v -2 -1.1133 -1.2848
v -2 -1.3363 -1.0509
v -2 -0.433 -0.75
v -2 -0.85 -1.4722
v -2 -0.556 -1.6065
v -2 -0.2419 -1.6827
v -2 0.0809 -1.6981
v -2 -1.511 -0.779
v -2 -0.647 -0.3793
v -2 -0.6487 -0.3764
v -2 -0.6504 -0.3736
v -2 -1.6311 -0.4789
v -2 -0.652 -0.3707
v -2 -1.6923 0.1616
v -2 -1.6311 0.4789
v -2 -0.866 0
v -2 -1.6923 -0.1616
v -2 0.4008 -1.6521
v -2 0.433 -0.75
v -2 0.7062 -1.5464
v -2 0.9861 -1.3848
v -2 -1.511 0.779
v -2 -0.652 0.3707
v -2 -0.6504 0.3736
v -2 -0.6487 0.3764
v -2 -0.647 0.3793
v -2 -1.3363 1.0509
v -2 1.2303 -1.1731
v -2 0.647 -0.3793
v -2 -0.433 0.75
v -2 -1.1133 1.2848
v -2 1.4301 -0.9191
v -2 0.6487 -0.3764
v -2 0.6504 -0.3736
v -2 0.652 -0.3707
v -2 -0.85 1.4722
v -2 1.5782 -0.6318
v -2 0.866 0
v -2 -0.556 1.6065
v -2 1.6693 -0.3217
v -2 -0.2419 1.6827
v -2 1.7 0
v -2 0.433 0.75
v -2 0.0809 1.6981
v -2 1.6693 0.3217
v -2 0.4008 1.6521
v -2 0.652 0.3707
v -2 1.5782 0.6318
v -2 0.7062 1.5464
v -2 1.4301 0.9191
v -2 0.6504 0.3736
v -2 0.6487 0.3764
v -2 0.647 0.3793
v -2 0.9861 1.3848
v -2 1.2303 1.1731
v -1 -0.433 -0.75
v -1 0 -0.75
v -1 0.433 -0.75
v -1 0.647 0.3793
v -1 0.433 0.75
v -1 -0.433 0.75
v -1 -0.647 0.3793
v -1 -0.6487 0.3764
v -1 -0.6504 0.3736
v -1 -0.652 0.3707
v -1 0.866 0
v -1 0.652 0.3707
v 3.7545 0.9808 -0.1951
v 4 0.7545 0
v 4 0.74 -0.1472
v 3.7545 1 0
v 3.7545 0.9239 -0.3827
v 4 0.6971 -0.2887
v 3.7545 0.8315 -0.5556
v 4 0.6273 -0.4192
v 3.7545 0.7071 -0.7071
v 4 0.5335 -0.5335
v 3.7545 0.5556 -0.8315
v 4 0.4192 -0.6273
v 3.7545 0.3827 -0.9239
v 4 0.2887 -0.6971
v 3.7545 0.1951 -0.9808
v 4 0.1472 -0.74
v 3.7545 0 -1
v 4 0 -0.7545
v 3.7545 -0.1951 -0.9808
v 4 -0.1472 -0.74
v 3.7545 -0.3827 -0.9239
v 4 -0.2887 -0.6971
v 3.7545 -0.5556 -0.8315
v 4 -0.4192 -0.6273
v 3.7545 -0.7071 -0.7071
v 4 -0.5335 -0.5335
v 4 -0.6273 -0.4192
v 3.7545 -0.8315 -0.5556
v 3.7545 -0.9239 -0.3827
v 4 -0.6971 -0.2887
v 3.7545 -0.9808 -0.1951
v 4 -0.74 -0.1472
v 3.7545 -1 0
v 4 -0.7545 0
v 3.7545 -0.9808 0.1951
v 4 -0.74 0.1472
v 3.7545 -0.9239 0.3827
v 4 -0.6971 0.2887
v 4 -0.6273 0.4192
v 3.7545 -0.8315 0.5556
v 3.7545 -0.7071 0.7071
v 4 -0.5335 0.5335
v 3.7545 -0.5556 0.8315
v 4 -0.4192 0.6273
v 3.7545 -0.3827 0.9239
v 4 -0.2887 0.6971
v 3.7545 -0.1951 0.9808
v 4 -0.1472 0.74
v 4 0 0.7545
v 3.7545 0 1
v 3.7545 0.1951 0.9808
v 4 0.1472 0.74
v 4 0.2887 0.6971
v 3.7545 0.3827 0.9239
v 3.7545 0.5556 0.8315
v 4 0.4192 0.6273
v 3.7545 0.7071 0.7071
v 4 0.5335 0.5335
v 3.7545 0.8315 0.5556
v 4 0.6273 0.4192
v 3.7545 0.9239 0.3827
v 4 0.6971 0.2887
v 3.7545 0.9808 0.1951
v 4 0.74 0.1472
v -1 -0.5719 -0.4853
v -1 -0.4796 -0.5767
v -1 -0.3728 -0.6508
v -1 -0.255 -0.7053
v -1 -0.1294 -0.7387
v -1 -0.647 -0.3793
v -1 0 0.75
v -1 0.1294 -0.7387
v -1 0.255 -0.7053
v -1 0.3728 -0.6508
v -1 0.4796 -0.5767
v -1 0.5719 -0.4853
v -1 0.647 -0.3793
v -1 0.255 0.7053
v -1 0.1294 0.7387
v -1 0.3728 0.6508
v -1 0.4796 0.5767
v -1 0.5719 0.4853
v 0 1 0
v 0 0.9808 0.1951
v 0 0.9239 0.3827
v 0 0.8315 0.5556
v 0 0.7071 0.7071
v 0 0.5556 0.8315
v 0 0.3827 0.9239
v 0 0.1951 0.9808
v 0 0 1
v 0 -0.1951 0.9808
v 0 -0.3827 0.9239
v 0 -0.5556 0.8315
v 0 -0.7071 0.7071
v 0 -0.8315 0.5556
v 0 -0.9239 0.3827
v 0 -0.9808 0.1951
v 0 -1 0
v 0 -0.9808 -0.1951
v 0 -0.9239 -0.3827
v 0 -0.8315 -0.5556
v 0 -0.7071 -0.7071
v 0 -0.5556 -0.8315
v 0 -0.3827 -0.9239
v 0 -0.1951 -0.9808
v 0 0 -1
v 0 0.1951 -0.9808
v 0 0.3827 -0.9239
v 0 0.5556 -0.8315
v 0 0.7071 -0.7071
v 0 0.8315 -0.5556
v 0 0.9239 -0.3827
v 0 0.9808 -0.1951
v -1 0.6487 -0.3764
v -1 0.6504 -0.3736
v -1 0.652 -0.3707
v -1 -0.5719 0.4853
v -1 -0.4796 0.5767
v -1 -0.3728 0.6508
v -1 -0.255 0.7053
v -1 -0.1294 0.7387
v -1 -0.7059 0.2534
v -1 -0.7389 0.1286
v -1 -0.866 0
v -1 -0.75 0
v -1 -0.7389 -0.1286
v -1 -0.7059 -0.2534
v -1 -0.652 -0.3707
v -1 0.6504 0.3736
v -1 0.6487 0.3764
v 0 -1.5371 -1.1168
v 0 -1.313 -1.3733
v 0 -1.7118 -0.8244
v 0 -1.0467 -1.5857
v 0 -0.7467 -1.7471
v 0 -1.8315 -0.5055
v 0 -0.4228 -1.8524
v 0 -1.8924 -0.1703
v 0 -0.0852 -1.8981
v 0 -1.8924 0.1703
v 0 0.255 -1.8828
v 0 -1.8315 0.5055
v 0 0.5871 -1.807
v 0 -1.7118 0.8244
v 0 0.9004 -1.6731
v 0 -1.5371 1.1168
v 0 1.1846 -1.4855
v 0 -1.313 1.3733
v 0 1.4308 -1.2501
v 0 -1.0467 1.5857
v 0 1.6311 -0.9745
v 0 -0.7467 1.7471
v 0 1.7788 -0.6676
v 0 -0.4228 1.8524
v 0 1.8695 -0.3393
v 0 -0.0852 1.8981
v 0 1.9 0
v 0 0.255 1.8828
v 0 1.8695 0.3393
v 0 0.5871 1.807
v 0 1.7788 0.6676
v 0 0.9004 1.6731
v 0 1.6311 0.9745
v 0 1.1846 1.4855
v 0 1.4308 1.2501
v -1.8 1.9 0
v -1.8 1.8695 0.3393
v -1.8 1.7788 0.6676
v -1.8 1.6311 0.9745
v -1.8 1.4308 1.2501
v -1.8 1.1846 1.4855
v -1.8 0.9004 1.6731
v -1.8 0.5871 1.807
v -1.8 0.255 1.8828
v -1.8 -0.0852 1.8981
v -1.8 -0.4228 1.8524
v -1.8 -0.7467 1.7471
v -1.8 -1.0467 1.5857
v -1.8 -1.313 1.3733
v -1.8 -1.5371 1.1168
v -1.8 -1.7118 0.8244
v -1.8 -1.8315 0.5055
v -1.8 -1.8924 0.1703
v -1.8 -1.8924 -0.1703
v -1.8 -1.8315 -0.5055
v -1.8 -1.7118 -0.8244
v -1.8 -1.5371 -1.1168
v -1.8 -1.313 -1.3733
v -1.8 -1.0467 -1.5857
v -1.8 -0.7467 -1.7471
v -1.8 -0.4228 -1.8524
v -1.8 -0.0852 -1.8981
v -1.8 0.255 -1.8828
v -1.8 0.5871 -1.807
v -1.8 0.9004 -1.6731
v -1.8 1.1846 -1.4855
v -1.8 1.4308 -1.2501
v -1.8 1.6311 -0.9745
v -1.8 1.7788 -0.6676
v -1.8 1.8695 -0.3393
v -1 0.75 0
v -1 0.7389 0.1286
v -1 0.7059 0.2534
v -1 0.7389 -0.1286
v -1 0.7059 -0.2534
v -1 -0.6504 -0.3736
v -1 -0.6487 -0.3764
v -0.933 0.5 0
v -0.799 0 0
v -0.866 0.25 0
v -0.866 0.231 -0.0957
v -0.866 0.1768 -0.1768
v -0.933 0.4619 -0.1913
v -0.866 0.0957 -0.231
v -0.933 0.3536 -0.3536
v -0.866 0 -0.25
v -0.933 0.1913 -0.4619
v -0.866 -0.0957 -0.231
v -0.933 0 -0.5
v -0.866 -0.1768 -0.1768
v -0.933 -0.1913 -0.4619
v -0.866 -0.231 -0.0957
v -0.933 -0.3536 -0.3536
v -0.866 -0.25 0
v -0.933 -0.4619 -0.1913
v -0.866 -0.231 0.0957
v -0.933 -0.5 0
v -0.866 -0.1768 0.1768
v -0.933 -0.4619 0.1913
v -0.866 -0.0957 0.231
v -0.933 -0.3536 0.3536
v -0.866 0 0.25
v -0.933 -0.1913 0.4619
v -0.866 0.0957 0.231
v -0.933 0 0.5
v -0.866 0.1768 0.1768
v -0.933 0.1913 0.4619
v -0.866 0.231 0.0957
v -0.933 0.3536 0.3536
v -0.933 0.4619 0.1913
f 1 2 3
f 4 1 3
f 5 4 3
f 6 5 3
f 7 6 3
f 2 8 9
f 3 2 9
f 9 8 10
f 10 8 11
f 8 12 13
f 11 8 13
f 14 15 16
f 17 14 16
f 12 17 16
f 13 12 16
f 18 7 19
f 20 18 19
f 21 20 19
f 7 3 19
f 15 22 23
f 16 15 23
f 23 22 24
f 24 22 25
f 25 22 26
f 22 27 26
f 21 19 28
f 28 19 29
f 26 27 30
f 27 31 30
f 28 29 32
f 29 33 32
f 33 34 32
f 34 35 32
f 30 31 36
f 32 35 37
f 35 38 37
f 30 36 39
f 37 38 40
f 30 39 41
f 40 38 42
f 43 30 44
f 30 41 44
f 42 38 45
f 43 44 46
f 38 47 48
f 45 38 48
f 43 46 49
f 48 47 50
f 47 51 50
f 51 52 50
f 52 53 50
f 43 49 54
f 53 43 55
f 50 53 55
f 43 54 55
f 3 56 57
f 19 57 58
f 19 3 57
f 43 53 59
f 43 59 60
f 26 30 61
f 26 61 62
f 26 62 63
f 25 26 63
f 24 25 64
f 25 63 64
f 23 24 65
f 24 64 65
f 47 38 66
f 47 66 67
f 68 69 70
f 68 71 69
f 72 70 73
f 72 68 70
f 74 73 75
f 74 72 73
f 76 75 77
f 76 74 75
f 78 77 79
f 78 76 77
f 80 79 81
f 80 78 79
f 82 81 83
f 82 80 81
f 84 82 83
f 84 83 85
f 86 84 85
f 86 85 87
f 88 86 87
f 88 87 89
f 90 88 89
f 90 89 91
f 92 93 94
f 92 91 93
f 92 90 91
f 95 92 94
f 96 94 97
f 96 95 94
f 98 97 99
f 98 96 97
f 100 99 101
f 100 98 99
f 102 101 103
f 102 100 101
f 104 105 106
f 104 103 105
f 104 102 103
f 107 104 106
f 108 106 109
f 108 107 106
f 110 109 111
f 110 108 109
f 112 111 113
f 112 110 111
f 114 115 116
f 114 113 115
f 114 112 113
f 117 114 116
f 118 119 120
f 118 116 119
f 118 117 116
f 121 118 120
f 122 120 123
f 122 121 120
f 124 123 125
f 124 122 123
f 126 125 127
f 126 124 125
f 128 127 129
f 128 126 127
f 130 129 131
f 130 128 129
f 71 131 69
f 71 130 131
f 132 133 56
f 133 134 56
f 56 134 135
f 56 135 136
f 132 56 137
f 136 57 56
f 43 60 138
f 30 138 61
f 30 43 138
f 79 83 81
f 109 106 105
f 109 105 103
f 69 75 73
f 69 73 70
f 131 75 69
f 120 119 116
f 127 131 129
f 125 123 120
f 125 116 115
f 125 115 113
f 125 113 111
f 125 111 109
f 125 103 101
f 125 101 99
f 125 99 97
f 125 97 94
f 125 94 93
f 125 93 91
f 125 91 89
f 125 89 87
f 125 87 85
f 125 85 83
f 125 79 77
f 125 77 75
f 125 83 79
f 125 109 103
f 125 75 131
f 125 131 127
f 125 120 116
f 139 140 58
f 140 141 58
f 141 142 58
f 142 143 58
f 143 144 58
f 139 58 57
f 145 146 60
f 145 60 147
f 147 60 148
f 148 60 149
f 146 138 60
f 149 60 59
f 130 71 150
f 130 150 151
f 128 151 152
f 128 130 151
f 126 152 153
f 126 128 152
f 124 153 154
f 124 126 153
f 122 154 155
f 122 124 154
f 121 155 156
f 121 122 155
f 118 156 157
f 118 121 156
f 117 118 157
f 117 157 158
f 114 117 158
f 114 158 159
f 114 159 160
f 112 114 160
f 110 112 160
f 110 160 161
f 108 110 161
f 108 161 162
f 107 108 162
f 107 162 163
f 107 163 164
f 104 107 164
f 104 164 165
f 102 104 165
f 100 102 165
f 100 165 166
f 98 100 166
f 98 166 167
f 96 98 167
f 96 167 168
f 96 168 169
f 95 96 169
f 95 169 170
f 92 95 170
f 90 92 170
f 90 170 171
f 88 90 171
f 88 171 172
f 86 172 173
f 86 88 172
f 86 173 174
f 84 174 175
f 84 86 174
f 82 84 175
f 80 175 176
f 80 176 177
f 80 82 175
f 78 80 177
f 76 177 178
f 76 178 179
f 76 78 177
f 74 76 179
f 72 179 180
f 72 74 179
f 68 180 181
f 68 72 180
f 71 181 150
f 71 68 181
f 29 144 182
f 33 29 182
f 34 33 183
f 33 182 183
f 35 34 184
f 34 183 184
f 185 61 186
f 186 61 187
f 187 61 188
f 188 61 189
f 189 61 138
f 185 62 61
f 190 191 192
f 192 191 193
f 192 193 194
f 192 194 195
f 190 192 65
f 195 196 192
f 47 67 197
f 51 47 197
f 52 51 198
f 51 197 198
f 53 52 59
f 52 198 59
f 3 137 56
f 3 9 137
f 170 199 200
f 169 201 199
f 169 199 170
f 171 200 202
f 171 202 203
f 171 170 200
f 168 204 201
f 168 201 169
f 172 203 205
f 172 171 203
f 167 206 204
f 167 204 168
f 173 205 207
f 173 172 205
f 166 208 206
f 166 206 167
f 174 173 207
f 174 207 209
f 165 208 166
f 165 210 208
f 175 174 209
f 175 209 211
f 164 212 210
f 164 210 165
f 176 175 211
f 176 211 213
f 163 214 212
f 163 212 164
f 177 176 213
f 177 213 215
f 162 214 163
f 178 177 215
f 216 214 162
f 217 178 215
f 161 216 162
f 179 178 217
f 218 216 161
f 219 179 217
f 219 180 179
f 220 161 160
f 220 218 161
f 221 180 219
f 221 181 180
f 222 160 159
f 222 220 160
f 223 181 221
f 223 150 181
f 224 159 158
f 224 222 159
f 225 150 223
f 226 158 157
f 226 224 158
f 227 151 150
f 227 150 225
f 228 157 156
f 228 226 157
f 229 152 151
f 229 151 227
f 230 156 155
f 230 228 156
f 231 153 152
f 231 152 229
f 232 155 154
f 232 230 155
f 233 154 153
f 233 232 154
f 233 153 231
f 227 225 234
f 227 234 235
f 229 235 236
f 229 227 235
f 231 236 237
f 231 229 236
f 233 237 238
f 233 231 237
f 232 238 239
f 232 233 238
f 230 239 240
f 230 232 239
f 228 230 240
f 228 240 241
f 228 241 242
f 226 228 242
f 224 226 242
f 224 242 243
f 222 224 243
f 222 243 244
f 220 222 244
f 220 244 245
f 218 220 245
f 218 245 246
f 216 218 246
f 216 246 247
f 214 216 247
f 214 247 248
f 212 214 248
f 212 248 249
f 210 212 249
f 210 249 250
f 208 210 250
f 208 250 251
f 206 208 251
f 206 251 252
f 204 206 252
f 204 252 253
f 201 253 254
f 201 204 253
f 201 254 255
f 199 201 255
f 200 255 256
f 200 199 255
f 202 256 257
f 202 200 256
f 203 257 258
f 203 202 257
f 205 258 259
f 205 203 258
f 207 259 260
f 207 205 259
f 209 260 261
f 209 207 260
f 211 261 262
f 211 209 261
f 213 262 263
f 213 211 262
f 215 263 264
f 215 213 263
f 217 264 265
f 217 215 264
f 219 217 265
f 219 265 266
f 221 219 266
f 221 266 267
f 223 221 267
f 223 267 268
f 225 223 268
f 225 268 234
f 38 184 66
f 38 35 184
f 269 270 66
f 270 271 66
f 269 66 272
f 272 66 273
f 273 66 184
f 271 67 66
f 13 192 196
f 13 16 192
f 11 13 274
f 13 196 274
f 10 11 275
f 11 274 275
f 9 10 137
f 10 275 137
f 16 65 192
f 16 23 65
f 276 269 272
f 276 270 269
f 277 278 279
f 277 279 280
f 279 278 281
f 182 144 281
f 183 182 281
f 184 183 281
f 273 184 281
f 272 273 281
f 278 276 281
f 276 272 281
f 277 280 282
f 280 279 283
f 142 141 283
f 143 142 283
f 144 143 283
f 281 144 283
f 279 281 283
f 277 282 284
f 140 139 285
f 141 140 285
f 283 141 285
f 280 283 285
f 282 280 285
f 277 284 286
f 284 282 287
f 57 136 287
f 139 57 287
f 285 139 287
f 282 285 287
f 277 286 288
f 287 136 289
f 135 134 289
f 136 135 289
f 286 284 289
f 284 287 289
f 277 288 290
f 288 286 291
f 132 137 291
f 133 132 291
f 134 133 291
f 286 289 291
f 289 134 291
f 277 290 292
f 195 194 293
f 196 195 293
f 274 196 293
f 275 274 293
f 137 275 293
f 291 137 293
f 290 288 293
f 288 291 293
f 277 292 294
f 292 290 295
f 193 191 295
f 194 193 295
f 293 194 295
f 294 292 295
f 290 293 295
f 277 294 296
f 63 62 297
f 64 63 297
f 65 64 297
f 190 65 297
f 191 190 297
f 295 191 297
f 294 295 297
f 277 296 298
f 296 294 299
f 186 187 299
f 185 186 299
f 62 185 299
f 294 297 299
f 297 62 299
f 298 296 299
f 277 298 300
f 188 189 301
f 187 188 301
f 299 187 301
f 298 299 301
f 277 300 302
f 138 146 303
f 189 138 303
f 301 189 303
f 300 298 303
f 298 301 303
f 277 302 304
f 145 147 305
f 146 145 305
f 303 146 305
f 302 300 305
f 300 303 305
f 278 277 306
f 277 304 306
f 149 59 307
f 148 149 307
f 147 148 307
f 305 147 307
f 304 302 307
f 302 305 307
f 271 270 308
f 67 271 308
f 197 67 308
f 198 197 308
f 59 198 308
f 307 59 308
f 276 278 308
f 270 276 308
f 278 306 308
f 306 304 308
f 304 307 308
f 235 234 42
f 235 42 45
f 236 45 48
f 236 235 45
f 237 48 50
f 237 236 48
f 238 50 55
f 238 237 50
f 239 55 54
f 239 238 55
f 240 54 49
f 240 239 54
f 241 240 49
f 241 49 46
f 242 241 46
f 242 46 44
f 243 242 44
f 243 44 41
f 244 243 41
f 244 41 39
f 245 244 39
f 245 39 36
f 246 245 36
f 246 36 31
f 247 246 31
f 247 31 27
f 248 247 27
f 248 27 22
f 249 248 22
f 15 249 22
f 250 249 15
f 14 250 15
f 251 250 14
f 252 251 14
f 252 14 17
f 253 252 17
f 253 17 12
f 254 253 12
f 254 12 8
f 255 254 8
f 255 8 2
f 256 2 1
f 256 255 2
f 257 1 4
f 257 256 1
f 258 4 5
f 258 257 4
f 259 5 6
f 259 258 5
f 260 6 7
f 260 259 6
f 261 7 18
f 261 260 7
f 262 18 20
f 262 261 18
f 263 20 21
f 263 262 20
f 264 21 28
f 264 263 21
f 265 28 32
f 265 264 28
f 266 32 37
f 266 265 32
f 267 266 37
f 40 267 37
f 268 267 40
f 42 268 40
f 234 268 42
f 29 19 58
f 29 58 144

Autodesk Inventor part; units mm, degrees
sketch "Sketch_1" plane through (0, 0, 0) normal (0, 0, 1) x (1, 0, 0)
  line L0 (4, 0) -> (-2, 0)
  line L1 (-2, 0) -> (-2, 1.7)
  line L2 (-2, 1.7) -> (-1.8, 1.9)
  line L3 (-1.8, 1.9) -> (0, 1.9)
  line L4 (0, 1.9) -> (0, 1)
  line L5 (0, 1) -> (3.7545, 1)
  line L6 (3.7545, 1) -> (4, 0.7545)
  line L7 (4, 0.7545) -> (4, 0)
  line L8 (4, 0) -> (-2, 0)
revolve "Revolution1" add sketch "Sketch_1" angle 360 about axis through (4, 0, 0) along (1, 0, 0)
thread "Thread1" size "M2x0.4" class "6g" standard "ISO Metric profile" length 2.7545
sketch "Sketch_4_ALT_Drilling_1" plane through (0, 0, 0) normal (0, 0, 1) x (1, 0, 0)
  line L0 (-0.799, 0) -> (-2, 0)
  line L1 (-2, 0) -> (-2, 0.75)
  line L2 (-2, 0.75) -> (-1, 0.75)
  line L3 (-1, 0.75) -> (-0.799, 0)
  line L4 (-0.799, 0) -> (-2, 0)
revolve "Revolution2" cut sketch "Sketch_4_ALT_Drilling_1" angle 360 about axis through (-0.799, 0, 0) along (1, 0, 0)
sketch "Sketch_3" plane through (-2, 0, 0) normal (1, 0, 0) x (0, 0, -1)
  line L0 (-0.75, -0.433) -> (0, -0.866)
  line L1 (0, -0.866) -> (0.75, -0.433)
  line L2 (0.75, -0.433) -> (0.75, 0.433)
  line L3 (0.75, 0.433) -> (0, 0.866)
  line L4 (0, 0.866) -> (-0.75, 0.433)
  line L5 (-0.75, 0.433) -> (-0.75, -0.433)
extrude "Extrusion1" cut sketch "Sketch_3" along normal blind 1
ref_plane "bolt_to_nut_XY" through (4, 0, 0) normal (1, 0, 0) x (0, 0, -1)
ref_plane "bolt_to_nut_YZ" through (4, 0, 0) normal (0, 0, -1) x (0, 1, 0)
ref_plane "bolt_to_nut_ZX" through (4, 0, 0) normal (0, 1, 0) x (1, 0, 0)
ref_plane "screw1_XY" through (0, 0, 0) normal (1, 0, 0) x (0, 0, -1)
ref_plane "screw1_YZ" through (0, 0, 0) normal (0, 0, -1) x (0, 1, 0)
ref_plane "screw1_ZX" through (0, 0, 0) normal (0, 1, 0) x (1, 0, 0)
properties part number "CB2-4" material "鋼、炭素鋼"
